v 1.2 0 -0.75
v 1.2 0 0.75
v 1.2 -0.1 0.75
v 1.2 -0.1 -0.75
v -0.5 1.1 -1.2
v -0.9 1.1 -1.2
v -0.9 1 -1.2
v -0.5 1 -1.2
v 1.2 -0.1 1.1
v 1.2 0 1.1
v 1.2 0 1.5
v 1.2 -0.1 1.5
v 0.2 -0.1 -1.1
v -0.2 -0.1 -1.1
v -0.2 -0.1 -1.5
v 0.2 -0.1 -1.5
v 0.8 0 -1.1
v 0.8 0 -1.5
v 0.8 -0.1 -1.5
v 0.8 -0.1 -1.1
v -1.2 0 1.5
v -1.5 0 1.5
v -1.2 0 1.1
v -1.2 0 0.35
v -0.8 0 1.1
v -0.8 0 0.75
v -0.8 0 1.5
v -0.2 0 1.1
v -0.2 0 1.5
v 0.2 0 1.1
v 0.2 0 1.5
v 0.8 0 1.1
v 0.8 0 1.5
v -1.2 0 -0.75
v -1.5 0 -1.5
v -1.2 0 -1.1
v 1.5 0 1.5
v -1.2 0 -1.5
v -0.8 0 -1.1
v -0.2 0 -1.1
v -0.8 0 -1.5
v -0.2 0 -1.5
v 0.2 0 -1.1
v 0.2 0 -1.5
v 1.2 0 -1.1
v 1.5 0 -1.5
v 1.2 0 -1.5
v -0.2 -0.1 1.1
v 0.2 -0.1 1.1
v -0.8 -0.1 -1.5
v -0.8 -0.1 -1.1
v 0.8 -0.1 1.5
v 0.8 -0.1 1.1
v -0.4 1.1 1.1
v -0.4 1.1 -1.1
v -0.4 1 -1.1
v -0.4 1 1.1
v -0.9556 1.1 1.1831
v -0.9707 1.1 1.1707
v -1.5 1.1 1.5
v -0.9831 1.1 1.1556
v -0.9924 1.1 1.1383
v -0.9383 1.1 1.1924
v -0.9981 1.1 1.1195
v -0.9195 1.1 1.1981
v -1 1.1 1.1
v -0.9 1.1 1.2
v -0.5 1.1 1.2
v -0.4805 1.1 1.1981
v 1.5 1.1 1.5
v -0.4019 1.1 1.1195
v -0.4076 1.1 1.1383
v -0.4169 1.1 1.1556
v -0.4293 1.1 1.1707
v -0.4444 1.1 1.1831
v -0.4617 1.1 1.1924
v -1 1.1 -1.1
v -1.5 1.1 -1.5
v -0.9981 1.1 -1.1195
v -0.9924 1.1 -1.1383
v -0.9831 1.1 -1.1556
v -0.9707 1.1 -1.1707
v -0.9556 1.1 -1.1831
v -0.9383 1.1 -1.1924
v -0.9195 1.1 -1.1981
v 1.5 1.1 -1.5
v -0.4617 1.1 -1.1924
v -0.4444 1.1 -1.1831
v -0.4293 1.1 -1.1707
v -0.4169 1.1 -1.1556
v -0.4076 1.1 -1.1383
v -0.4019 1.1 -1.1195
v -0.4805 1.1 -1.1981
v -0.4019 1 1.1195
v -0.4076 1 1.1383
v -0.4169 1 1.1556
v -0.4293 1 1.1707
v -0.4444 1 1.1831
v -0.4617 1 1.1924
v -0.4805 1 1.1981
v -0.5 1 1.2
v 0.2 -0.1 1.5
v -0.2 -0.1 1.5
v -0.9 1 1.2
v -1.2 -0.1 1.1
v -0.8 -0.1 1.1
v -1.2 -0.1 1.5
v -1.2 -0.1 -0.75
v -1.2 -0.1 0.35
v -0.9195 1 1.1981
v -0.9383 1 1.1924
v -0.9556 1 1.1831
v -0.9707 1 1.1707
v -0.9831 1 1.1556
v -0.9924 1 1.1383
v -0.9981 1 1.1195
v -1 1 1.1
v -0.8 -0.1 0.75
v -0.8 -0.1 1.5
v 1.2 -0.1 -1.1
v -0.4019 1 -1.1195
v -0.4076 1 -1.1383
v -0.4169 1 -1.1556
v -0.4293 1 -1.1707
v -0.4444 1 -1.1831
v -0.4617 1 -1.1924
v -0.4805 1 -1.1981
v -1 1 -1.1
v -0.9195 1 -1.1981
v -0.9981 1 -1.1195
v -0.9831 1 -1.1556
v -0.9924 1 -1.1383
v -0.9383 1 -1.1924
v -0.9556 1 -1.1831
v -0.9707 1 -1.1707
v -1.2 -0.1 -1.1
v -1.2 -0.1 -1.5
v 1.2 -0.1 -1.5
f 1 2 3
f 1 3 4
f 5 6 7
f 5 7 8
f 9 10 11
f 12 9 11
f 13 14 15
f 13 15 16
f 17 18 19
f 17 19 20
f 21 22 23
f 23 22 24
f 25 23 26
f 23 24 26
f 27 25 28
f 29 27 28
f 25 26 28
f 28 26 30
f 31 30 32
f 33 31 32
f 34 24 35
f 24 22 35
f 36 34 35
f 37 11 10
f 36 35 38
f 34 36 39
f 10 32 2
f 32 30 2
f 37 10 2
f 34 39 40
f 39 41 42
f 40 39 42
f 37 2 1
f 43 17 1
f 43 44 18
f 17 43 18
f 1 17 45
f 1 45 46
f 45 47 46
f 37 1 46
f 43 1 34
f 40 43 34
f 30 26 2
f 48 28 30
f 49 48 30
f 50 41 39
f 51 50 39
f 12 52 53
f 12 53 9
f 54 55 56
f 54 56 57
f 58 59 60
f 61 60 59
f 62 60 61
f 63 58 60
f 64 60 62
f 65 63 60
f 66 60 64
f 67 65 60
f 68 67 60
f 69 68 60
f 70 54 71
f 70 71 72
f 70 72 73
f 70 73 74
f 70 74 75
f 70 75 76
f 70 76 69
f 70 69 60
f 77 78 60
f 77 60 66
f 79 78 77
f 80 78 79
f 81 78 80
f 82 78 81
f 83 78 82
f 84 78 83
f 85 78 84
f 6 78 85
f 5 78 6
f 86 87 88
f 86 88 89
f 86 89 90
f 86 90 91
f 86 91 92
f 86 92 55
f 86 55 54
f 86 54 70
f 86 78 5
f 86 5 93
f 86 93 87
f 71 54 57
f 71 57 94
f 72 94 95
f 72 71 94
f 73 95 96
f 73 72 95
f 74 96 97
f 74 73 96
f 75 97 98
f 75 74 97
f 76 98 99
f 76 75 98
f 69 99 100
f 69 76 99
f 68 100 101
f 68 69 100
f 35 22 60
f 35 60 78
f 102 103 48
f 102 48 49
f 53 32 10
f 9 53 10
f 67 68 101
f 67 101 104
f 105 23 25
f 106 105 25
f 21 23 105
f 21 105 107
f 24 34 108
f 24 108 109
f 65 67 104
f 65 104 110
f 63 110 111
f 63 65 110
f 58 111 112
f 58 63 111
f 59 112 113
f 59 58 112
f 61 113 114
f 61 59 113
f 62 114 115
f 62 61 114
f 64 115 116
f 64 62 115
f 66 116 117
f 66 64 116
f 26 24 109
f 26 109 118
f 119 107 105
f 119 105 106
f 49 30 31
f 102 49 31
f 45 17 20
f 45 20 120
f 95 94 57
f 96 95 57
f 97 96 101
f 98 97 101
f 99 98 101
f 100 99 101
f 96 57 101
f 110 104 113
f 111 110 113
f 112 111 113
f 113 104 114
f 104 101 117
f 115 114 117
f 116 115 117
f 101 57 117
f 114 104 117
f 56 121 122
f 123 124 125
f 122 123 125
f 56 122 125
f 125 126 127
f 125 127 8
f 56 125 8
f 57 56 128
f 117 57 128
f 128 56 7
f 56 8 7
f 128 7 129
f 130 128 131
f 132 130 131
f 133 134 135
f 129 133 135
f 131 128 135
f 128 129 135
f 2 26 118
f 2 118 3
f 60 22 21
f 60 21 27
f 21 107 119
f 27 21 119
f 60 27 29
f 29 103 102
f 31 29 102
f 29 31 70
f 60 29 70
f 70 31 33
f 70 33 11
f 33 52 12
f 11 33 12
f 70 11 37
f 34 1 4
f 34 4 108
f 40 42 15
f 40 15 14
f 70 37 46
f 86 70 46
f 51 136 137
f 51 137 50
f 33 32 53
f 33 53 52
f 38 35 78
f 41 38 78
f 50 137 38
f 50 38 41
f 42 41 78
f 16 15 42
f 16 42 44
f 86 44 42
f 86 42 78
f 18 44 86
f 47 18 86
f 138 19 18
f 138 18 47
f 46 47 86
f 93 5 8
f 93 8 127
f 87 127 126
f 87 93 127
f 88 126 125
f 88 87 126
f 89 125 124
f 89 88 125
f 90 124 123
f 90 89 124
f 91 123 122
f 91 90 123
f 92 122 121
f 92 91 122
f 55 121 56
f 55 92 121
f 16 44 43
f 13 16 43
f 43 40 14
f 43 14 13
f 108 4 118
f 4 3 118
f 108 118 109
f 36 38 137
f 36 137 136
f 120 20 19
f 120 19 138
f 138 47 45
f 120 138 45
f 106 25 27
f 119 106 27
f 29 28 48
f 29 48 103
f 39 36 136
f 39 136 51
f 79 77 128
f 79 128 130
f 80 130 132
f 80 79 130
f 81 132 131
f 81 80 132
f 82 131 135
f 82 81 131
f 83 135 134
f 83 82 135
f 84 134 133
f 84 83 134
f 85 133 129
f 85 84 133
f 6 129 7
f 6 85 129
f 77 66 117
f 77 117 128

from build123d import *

# Parameters (mm, degrees)
SKETCH_1_W          = 3
SKETCH_1_H          = 3
EXTRUDE_1_DEPTH     = 1.1
CUT_EXTRUDE_1_DEPTH = 0.1
SKETCH_3_W          = 0.4
SKETCH_3_H          = 0.4
EXTRUDE_2_DEPTH     = 0.1


with BuildPart() as part:
    # Эскиз1 → Бобышка-Вытянуть1 (new body)
    with BuildSketch(Plane(origin=(0, 0, 0), x_dir=(1, 0, 0), z_dir=(0, 1, 0))):
        Rectangle(SKETCH_1_W, SKETCH_1_H)
    extrude(amount=EXTRUDE_1_DEPTH)

    # Эскиз2 → Вырез-Вытянуть1 (cut)
    with BuildSketch(Plane(origin=(0, 1.1, 0), x_dir=(1, 0, 0), z_dir=(0, 1, 0))):
        with BuildLine():
            Line((-0.9, 1.2), (-0.5, 1.2))
            ThreePointArc((-0.5, 1.2), (-0.429289322, 1.170710678), (-0.4, 1.1))
            Line((-0.4, 1.1), (-0.4, -1.1))
            ThreePointArc((-0.4, -1.1), (-0.429289322, -1.170710678), (-0.5, -1.2))
            Line((-0.5, -1.2), (-0.9, -1.2))
            ThreePointArc((-0.9, -1.2), (-0.970710678, -1.170710678), (-1, -1.1))
            Line((-1, -1.1), (-1, 1.1))
            ThreePointArc((-1, 1.1), (-0.970710678, 1.170710678), (-0.9, 1.2))
        make_face()
    extrude(amount=-CUT_EXTRUDE_1_DEPTH, mode=Mode.SUBTRACT)

    # Эскиз3 → Бобышка-Вытянуть2 (add)
    with BuildSketch(Plane.XZ):
        Polygon((1.2, -0.75), (-1.2, -0.75), (-1.2, 0.35), (-0.8, 0.75), (1.2, 0.75), align=None)
        with Locations((1, -1.3)):
            Rectangle(SKETCH_3_W, SKETCH_3_H)
        with Locations((0, -1.3)):
            Rectangle(SKETCH_3_W, SKETCH_3_H)
        with Locations((-1, -1.3)):
            Rectangle(SKETCH_3_W, SKETCH_3_H)
        with Locations((1, 1.3)):
            Rectangle(SKETCH_3_W, SKETCH_3_H)
        with Locations((0, 1.3)):
            Rectangle(SKETCH_3_W, SKETCH_3_H)
        with Locations((-1, 1.3)):
            Rectangle(SKETCH_3_W, SKETCH_3_H)
    extrude(amount=EXTRUDE_2_DEPTH)


solid = part.part
